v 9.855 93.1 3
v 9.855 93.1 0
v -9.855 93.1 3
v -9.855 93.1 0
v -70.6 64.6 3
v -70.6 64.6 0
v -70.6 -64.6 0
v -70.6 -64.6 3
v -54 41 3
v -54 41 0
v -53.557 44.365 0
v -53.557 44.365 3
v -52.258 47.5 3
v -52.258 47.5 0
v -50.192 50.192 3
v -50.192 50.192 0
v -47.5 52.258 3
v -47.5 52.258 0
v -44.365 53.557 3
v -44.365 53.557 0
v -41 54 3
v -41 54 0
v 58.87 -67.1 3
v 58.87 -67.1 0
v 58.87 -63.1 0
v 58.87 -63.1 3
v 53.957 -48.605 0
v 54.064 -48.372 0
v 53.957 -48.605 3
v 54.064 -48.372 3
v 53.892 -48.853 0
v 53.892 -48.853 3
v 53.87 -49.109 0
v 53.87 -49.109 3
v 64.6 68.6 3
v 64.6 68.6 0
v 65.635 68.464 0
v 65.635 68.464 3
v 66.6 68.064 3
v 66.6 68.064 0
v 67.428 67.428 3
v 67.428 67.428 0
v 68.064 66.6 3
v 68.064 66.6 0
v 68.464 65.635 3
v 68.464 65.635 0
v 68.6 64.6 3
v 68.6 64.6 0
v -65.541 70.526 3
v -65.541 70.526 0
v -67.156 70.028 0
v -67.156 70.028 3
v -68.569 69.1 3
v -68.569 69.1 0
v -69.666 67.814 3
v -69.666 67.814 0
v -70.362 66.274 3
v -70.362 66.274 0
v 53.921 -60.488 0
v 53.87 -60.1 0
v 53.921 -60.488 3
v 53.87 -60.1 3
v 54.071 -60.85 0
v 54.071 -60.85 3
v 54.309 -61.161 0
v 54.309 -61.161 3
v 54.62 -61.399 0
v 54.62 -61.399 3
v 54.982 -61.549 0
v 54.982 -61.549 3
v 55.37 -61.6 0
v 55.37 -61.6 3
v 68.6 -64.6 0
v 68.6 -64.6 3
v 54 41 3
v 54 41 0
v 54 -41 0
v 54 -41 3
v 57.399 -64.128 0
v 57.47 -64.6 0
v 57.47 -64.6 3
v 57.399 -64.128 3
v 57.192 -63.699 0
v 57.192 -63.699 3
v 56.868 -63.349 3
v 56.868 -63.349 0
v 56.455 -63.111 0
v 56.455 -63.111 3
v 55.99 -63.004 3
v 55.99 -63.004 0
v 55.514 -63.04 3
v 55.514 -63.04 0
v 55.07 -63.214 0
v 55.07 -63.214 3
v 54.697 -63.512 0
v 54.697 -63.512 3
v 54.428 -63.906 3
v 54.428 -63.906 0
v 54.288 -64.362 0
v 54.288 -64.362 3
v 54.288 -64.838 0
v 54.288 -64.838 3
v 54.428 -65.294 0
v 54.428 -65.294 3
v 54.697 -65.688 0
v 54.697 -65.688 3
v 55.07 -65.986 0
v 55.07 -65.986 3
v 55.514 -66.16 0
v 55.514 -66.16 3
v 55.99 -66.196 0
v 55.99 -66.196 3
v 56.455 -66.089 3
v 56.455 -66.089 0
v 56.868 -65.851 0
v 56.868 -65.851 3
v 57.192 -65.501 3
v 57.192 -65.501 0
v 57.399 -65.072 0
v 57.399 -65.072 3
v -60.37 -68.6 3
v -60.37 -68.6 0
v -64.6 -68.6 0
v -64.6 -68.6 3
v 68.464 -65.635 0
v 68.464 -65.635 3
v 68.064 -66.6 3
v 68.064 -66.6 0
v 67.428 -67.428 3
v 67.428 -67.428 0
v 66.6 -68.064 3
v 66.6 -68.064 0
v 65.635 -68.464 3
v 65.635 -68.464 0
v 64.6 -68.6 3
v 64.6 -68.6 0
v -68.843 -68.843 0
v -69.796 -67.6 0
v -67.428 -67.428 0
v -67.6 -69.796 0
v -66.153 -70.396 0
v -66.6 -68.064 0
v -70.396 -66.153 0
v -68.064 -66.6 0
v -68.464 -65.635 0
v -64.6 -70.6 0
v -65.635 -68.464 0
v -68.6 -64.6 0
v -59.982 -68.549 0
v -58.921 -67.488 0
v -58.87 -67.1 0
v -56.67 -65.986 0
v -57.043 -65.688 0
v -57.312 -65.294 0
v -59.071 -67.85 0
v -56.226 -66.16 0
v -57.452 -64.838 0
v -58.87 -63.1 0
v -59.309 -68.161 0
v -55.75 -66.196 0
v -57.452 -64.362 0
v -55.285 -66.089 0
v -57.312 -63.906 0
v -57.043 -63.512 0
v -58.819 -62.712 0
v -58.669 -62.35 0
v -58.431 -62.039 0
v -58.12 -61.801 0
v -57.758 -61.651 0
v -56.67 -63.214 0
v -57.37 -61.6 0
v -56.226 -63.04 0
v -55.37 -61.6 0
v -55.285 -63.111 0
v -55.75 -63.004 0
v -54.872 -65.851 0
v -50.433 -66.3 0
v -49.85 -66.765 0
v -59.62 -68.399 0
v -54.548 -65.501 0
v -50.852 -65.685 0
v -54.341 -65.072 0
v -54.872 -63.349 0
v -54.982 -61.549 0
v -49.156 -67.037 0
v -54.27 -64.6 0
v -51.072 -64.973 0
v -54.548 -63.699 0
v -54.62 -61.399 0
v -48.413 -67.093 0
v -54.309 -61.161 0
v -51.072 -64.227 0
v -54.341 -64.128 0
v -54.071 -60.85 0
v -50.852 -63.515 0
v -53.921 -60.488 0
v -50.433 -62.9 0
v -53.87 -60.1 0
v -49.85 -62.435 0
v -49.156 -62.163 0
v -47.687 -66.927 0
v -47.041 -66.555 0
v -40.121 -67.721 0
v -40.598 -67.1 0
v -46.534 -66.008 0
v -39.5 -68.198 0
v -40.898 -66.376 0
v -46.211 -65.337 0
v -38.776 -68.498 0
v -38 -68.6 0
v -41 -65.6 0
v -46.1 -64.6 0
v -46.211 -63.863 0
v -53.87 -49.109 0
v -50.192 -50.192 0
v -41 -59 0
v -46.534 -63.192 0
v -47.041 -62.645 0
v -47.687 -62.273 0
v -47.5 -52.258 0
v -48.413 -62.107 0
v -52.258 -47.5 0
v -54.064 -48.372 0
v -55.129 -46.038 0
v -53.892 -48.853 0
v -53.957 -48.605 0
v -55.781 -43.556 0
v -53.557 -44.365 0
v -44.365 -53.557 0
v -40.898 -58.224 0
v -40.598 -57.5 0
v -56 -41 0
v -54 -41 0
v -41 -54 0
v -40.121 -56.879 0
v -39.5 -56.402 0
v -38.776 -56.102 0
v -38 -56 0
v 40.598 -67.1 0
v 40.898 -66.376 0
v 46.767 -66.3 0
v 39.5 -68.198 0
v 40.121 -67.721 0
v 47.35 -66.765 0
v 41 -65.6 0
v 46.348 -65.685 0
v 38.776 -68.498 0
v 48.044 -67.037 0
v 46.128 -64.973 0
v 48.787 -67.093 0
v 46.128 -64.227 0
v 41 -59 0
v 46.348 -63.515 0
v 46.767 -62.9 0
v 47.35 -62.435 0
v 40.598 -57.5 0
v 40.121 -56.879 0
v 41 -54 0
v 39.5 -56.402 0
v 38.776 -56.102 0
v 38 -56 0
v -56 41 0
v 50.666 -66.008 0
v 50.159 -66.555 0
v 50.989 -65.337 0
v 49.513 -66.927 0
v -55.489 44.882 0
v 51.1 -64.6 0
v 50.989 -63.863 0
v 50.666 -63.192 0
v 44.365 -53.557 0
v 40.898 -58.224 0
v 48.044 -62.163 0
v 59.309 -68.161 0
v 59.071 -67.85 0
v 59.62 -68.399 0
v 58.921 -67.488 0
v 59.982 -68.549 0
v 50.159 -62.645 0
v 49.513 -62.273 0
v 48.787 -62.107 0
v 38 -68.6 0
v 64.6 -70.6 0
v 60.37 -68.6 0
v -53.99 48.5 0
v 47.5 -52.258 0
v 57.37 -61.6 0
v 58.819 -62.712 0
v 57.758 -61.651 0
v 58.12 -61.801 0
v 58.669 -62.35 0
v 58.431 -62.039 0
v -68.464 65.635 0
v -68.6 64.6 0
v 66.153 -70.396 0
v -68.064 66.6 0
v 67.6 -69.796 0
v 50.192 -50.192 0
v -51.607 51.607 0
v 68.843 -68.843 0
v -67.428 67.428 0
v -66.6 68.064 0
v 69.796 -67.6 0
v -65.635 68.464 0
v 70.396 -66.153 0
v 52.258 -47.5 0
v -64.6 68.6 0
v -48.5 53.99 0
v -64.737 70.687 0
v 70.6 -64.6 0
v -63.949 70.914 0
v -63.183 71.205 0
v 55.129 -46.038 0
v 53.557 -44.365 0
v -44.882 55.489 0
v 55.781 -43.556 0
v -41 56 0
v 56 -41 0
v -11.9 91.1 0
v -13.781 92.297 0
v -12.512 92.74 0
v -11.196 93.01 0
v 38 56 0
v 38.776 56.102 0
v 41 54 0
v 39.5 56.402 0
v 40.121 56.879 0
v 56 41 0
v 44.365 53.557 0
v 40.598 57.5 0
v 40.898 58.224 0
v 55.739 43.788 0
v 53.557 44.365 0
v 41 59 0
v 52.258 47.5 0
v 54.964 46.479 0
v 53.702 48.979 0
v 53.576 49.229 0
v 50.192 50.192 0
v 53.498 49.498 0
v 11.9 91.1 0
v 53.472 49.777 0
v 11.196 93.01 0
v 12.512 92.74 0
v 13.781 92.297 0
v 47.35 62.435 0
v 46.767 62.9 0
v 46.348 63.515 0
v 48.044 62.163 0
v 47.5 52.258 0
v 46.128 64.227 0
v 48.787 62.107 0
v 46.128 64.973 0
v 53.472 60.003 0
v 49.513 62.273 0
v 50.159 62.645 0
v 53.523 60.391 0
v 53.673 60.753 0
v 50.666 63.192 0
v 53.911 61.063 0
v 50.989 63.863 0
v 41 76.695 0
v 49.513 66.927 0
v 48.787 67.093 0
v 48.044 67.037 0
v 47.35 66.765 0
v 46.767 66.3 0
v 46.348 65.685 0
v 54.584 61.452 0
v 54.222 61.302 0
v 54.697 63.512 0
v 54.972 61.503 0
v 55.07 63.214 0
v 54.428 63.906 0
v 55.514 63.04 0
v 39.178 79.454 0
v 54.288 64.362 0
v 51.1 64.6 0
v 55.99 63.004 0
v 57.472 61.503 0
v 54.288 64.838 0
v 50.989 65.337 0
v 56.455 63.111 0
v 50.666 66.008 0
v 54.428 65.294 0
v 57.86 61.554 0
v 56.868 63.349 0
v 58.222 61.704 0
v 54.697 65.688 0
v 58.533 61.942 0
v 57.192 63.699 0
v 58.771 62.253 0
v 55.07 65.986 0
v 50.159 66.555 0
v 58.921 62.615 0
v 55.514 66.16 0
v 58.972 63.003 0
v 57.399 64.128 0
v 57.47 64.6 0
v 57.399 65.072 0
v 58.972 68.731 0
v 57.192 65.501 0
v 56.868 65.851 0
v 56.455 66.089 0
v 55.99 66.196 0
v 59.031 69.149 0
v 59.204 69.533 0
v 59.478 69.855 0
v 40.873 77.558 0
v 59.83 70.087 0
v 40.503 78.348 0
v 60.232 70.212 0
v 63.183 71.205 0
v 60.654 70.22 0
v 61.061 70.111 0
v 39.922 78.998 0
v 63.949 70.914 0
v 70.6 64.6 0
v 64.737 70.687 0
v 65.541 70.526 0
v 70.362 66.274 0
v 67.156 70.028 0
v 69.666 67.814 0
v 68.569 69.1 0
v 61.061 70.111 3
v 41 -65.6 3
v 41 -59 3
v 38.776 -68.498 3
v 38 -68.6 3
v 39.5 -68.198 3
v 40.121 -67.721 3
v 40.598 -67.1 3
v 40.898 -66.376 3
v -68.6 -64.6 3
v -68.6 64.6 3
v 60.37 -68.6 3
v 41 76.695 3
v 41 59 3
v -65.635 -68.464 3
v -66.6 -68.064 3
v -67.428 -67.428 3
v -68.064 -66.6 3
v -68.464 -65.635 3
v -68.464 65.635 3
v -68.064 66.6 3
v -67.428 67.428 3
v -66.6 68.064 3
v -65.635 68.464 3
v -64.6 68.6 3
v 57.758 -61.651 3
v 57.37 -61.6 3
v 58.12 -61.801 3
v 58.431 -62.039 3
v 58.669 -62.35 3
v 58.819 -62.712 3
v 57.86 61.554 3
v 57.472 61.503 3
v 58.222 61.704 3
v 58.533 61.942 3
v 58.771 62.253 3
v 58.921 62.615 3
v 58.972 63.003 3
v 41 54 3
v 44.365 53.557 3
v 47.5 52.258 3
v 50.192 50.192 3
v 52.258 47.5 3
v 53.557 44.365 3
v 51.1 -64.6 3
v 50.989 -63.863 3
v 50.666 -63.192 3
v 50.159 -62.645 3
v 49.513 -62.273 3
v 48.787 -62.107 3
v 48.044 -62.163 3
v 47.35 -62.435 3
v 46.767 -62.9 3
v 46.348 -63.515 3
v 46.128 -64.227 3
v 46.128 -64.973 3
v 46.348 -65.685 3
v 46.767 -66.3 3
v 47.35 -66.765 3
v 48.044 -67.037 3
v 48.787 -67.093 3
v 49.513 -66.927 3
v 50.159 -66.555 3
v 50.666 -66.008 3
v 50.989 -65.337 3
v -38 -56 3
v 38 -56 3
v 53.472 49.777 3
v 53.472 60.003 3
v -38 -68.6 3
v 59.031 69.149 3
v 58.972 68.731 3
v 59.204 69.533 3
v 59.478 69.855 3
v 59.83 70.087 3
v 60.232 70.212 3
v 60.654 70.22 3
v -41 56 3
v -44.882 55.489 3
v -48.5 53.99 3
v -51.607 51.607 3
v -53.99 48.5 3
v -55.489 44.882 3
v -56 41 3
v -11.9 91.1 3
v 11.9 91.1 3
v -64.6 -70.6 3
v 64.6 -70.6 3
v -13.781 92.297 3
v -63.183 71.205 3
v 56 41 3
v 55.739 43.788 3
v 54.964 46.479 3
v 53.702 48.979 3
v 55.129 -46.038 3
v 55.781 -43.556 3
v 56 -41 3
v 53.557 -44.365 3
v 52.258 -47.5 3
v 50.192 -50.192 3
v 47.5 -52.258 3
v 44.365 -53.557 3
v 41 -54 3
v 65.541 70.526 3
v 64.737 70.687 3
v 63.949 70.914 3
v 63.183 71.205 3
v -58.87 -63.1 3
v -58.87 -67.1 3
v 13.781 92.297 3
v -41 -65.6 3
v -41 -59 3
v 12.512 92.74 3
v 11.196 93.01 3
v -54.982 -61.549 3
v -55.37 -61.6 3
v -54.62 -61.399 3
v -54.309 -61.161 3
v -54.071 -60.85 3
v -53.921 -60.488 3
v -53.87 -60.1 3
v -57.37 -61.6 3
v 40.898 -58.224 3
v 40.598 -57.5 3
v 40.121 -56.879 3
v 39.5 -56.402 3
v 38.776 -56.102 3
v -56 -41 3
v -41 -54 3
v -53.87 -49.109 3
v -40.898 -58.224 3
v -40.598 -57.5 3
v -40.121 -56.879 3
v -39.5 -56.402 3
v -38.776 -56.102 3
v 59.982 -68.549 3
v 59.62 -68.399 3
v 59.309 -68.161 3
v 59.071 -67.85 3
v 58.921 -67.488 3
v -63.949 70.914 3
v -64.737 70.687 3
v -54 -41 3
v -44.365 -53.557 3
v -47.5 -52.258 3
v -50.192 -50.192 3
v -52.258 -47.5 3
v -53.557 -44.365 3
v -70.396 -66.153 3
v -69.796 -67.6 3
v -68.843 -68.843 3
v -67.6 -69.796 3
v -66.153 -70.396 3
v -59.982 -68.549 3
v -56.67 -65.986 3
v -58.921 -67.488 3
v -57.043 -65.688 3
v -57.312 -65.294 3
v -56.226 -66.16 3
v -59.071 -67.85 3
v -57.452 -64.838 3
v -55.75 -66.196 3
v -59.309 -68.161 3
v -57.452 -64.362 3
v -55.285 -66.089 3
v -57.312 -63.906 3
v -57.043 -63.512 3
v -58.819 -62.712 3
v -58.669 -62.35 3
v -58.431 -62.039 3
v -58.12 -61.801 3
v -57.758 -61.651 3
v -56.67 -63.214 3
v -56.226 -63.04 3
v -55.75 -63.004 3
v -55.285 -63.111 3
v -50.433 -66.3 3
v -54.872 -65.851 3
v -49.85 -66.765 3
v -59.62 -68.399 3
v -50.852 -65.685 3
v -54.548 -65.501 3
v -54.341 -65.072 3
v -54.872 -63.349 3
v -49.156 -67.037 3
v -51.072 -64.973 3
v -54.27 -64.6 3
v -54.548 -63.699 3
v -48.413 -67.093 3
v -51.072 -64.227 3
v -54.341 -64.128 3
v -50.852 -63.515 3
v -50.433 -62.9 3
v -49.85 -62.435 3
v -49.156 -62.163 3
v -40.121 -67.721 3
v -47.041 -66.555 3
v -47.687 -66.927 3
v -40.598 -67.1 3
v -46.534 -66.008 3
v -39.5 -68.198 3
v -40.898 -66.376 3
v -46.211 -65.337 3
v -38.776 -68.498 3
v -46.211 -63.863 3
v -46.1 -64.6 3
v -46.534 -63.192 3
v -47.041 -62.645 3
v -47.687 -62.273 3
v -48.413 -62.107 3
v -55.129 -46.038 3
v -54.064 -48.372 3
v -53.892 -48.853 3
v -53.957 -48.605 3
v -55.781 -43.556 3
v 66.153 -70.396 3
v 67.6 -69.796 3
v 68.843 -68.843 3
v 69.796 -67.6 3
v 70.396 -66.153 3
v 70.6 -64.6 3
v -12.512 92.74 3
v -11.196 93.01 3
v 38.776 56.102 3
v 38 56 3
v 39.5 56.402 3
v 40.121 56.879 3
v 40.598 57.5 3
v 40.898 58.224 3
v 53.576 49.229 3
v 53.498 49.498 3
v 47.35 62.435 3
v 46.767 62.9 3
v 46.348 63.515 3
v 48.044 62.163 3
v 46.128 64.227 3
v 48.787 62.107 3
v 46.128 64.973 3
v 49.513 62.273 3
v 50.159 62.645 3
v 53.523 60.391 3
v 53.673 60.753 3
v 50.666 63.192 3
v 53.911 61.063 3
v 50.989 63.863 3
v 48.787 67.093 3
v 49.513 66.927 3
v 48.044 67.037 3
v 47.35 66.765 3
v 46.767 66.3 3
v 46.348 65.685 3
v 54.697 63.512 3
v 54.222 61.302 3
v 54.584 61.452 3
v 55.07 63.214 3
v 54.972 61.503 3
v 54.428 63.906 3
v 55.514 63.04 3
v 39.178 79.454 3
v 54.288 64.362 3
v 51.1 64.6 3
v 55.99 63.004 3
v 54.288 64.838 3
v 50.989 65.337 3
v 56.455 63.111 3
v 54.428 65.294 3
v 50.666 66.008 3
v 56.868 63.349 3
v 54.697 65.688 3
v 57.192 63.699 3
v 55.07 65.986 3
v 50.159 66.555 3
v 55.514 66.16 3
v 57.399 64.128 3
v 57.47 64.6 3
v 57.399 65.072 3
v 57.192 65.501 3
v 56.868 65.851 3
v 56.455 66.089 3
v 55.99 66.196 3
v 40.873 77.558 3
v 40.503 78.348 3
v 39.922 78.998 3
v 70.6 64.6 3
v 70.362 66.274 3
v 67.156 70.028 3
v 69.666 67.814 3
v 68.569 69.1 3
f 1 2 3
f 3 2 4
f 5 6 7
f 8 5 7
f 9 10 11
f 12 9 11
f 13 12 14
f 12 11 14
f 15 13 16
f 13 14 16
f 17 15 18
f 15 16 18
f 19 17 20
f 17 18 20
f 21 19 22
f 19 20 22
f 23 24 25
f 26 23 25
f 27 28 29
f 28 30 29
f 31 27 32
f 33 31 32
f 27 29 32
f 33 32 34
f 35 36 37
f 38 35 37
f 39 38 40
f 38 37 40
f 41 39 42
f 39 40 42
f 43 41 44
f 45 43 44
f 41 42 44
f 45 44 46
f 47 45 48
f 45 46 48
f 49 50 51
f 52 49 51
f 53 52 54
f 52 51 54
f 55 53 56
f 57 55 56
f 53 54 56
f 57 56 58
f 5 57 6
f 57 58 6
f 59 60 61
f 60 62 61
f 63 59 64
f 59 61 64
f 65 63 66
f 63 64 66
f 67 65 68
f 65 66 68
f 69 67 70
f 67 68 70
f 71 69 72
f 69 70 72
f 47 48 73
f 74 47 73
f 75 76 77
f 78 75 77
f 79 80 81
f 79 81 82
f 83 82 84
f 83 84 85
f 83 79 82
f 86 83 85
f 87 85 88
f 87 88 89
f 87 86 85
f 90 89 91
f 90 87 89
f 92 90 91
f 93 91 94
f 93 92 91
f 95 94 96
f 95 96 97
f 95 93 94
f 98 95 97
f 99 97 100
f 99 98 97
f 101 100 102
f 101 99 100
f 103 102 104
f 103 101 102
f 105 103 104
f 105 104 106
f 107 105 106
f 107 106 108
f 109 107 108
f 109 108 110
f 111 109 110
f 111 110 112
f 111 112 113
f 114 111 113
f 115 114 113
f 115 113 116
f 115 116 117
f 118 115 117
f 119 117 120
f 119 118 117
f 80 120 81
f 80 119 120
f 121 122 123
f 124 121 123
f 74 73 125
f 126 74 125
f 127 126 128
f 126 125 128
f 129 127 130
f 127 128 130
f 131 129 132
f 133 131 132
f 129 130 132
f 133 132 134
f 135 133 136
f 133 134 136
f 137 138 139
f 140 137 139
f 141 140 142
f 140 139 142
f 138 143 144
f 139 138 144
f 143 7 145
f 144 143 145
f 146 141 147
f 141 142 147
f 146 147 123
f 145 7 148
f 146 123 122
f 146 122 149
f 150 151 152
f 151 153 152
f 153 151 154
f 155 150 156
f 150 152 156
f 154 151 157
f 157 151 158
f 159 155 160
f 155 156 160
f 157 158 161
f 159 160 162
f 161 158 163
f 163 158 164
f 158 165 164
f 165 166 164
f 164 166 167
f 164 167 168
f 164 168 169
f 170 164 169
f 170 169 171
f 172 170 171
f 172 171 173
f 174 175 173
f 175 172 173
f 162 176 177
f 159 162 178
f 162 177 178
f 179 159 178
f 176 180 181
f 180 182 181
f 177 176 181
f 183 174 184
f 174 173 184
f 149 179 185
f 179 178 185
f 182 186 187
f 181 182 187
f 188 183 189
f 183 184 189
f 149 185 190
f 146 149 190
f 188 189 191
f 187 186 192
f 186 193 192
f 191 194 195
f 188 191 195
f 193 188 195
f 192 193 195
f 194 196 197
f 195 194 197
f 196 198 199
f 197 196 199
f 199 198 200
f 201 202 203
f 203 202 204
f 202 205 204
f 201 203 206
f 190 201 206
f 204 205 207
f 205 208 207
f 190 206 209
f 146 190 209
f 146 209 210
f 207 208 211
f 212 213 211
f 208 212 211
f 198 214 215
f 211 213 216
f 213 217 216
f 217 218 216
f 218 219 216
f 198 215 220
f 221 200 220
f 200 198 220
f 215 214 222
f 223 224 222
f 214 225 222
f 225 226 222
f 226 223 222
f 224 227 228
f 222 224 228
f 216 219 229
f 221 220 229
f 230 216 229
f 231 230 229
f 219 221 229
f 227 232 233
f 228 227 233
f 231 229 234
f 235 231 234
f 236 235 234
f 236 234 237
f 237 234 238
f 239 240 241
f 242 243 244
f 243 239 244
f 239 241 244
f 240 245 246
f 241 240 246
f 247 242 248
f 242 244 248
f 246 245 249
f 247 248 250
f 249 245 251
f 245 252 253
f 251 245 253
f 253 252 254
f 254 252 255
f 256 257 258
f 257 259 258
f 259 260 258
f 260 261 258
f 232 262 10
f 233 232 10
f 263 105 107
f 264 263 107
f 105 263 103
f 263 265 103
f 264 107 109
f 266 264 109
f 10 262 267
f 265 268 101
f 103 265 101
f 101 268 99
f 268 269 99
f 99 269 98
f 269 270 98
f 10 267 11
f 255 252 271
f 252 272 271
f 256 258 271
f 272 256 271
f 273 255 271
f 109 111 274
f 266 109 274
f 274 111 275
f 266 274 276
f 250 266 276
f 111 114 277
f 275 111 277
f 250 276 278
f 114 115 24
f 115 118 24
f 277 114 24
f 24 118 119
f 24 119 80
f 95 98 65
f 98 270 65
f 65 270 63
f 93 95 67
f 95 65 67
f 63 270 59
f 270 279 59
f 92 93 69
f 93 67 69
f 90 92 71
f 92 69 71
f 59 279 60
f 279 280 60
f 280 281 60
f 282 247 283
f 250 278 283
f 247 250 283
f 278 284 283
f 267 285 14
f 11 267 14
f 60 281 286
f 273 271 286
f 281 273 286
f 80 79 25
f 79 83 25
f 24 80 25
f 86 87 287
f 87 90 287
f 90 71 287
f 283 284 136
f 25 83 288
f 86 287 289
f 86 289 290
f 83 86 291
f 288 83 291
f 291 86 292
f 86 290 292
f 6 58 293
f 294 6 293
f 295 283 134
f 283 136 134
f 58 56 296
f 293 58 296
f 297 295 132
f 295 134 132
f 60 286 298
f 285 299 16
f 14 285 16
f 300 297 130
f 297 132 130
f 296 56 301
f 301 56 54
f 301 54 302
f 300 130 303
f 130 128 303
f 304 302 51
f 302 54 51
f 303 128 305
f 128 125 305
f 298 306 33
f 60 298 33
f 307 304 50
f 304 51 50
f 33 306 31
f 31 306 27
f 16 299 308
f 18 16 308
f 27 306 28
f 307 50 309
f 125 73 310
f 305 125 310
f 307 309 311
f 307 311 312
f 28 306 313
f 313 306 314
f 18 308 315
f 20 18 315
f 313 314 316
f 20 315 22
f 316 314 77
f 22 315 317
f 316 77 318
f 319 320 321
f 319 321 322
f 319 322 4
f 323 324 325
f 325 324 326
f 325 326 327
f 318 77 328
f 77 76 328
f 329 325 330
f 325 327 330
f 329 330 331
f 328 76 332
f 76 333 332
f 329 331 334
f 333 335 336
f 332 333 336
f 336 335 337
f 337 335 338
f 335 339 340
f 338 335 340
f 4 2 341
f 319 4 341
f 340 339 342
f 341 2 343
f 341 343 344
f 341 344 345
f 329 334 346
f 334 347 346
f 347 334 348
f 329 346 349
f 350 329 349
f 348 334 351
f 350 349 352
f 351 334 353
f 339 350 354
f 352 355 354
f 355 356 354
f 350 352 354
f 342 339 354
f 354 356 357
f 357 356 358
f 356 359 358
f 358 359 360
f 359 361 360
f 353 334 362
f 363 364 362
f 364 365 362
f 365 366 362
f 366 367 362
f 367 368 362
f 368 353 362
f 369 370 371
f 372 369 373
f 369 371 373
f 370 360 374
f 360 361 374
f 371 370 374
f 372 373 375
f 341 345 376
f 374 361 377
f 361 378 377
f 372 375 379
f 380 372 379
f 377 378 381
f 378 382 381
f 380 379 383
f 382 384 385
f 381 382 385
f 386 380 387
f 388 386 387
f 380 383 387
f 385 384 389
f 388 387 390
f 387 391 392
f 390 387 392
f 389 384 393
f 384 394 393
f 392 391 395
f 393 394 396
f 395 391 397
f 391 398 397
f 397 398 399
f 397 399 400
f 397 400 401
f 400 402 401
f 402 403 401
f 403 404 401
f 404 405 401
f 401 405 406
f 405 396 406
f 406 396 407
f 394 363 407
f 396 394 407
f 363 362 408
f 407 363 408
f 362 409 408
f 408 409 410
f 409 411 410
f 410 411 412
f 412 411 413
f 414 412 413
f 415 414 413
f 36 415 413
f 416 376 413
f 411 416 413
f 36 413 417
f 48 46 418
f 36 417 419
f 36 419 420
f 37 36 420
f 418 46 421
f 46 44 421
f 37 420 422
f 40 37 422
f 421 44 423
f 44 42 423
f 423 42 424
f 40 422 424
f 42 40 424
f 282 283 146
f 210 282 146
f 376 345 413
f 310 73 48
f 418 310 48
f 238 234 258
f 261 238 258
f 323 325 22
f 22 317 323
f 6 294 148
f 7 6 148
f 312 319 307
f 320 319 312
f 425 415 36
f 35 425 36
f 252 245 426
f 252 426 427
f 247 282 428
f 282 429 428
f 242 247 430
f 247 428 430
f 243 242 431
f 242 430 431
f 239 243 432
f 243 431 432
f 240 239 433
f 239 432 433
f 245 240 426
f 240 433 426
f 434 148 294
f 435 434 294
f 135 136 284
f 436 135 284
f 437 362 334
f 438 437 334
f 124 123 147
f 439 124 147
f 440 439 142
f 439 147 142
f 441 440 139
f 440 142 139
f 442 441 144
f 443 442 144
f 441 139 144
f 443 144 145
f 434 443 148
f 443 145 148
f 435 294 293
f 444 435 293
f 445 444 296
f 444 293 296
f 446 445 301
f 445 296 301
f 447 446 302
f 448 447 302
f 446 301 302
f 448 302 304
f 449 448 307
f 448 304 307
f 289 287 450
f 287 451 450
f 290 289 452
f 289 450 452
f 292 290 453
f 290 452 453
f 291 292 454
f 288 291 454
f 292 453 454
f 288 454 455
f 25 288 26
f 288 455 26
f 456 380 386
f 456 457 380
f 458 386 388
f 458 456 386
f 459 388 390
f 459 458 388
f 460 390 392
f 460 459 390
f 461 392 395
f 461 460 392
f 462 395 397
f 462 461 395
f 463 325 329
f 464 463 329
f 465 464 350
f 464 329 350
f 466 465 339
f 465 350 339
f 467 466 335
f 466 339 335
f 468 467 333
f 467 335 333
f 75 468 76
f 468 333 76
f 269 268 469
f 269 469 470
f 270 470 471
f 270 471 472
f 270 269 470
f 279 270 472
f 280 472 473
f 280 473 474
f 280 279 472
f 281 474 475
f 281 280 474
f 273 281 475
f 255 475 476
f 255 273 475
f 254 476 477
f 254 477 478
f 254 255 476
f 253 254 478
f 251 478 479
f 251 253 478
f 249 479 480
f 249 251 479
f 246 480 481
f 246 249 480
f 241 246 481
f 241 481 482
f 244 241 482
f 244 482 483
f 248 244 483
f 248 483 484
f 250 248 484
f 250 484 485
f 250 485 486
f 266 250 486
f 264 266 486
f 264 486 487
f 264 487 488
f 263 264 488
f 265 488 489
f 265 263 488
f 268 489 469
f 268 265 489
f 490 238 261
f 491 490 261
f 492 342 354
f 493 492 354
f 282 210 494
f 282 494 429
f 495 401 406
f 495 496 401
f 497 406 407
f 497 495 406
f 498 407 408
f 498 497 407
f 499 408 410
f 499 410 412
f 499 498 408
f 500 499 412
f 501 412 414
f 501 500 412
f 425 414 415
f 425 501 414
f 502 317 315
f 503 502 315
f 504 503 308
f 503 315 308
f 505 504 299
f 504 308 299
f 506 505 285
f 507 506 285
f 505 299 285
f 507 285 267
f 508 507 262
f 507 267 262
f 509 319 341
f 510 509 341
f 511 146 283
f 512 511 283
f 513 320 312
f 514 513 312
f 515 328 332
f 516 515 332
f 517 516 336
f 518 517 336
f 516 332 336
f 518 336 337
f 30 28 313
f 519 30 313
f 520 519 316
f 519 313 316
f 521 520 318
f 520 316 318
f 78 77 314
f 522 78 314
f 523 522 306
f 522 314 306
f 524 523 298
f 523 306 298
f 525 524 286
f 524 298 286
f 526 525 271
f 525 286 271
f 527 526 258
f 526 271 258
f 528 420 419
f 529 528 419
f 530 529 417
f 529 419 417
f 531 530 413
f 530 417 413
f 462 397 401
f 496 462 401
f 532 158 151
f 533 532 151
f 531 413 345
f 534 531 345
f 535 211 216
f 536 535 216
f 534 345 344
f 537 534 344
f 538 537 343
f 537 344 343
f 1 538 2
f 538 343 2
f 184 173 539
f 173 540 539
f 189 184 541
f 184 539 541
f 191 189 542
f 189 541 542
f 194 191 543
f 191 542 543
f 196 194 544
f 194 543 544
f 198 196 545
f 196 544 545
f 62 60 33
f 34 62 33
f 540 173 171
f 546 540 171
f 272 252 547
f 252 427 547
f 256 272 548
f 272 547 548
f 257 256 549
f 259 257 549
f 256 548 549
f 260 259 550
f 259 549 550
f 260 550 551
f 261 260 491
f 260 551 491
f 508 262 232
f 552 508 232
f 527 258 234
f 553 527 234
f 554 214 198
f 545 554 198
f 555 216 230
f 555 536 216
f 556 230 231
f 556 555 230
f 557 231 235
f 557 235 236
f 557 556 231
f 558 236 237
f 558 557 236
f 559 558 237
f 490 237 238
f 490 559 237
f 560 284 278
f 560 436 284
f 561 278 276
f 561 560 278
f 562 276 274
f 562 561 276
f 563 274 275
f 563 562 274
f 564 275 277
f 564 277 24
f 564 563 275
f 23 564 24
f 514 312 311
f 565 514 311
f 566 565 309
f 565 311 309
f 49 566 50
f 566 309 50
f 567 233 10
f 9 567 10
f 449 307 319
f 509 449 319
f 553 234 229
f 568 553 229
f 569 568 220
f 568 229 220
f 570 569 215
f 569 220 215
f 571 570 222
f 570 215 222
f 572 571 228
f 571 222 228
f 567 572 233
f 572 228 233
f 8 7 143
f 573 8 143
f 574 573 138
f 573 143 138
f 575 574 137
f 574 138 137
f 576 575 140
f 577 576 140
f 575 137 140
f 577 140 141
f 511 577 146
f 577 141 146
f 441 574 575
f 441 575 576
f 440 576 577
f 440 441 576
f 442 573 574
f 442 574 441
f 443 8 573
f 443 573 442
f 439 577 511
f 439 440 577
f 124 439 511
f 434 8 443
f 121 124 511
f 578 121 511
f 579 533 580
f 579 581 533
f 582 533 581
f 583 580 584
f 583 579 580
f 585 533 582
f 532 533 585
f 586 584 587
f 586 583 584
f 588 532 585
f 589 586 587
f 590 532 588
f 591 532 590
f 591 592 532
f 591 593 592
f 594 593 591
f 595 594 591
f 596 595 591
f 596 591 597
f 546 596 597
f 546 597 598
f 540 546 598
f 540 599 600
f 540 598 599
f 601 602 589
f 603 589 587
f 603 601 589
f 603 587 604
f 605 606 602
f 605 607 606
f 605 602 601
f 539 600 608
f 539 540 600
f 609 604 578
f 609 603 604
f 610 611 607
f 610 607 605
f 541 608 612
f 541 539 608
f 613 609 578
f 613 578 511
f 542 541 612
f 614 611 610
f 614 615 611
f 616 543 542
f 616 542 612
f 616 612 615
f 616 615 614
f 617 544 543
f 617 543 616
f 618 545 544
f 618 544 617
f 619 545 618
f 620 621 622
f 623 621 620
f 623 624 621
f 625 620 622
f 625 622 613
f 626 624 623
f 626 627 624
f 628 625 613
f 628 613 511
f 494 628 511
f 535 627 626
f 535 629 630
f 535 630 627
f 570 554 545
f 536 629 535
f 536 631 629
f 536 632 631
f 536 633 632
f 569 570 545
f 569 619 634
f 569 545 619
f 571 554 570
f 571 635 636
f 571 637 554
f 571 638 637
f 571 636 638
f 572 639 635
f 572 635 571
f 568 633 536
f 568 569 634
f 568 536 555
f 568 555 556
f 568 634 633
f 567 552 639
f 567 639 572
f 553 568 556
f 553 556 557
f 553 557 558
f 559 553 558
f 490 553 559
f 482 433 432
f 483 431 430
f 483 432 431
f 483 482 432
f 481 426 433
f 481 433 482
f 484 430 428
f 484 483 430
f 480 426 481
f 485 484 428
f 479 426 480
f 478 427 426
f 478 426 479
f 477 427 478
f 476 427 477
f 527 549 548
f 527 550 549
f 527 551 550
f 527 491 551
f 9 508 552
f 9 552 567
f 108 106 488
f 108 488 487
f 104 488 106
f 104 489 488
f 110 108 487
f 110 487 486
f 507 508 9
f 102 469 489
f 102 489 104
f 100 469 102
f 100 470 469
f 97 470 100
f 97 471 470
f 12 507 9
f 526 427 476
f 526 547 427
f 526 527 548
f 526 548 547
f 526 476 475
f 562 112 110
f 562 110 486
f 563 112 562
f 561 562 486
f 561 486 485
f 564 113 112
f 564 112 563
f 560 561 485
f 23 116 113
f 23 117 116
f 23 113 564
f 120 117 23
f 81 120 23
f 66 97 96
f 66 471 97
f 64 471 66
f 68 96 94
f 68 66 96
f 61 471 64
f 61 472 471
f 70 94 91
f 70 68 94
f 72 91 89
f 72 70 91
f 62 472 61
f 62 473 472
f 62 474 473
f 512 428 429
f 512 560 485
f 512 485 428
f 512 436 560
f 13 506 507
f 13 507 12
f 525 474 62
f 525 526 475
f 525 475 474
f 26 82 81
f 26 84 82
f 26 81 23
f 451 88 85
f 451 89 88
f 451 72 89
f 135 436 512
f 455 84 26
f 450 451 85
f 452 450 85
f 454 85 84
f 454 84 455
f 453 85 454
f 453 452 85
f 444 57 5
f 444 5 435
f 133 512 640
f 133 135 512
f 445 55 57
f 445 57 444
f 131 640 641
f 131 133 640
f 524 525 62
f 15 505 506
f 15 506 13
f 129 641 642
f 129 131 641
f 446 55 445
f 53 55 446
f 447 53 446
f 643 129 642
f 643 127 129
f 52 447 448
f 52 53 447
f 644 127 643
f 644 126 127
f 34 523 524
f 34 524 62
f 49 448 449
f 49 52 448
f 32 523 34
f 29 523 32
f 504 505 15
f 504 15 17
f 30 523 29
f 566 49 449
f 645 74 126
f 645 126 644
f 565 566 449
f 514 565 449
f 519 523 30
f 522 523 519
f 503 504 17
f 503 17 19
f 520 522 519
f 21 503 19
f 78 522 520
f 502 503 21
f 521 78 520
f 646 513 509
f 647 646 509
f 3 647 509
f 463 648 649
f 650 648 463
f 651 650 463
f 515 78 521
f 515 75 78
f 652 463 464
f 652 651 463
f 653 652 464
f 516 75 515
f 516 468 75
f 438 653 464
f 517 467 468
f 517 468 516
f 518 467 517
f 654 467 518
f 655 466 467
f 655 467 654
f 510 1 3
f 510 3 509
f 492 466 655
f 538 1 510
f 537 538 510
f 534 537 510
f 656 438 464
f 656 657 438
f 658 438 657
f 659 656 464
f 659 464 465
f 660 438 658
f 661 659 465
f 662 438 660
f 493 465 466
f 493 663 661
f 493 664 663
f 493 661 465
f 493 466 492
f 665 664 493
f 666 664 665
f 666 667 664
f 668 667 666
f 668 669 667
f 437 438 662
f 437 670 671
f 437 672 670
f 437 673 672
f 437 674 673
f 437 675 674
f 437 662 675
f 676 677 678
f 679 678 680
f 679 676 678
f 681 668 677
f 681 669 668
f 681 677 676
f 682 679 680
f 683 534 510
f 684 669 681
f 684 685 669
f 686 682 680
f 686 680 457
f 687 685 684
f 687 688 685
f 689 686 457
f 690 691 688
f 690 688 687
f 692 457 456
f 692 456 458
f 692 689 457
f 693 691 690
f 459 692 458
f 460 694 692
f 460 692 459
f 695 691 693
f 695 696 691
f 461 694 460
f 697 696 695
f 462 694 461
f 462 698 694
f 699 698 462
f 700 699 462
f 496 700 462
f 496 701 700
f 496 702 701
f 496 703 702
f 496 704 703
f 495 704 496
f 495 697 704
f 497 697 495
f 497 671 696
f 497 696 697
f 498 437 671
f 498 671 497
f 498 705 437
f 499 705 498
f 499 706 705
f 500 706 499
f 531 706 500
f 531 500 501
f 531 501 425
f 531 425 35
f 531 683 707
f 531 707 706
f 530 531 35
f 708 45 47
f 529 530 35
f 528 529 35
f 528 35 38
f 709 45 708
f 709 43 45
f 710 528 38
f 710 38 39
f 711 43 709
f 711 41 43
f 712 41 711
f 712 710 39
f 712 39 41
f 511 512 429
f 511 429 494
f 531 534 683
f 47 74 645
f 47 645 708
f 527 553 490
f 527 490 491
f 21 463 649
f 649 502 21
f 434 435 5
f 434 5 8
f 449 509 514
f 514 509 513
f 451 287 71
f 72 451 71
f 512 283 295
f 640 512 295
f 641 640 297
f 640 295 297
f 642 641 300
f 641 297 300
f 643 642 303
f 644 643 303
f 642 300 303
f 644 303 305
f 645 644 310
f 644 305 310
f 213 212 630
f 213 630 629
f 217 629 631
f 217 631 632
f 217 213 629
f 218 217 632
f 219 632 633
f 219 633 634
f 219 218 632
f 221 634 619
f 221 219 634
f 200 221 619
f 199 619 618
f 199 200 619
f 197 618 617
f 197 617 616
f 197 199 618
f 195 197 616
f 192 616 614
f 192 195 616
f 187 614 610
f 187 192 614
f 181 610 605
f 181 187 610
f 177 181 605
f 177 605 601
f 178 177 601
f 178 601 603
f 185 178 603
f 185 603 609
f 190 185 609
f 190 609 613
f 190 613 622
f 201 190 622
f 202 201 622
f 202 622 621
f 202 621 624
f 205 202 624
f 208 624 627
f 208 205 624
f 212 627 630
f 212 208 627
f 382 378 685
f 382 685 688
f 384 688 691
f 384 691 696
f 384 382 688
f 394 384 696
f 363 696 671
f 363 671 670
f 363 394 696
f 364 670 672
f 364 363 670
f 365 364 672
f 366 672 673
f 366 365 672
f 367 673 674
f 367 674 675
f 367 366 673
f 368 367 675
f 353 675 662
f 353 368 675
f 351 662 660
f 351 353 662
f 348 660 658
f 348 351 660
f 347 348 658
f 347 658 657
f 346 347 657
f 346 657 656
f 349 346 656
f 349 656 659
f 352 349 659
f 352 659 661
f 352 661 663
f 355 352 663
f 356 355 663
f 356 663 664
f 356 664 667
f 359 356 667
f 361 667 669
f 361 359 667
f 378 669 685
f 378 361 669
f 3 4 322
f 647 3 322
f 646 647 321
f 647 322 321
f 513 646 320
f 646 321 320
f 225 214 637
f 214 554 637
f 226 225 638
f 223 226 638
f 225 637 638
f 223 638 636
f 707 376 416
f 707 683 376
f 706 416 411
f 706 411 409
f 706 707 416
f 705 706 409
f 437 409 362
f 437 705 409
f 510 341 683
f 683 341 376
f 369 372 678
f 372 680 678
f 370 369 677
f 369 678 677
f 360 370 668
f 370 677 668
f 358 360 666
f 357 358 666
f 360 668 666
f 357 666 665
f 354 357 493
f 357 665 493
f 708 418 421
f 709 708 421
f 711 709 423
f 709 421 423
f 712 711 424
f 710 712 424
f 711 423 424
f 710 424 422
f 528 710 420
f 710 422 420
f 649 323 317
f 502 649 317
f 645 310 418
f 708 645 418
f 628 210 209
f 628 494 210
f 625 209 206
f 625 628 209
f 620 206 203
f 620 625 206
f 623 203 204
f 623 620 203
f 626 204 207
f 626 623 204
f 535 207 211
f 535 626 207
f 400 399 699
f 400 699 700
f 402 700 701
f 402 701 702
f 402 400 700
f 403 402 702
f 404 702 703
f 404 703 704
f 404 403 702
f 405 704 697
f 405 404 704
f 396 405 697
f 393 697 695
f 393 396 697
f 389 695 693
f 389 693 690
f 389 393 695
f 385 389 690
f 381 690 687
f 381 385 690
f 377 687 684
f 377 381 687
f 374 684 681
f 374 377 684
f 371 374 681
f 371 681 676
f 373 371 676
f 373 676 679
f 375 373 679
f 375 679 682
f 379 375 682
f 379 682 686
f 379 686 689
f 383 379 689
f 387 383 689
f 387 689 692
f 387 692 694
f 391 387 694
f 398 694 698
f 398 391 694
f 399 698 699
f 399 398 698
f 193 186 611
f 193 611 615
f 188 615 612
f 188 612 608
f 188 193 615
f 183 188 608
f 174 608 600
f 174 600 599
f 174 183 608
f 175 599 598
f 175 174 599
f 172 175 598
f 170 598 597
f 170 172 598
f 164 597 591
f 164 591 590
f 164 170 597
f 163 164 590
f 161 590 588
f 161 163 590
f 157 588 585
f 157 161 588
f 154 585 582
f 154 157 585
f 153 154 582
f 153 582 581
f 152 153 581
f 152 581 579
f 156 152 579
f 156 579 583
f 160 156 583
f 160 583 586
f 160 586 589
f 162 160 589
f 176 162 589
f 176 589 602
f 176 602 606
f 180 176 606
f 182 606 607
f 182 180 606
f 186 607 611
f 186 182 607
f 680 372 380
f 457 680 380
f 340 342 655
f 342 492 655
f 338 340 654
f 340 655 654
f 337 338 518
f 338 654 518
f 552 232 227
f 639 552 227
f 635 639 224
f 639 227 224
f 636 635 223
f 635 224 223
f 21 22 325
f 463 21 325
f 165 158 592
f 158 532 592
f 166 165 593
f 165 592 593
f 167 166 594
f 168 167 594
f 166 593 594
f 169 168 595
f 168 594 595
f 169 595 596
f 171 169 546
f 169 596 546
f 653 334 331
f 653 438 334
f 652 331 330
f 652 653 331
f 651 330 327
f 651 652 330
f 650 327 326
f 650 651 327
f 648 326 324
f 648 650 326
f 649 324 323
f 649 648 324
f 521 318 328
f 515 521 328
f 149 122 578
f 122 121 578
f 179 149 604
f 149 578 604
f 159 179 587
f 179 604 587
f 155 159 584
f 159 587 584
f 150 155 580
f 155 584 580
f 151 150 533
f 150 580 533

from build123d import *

# Parameters (mm, degrees)
SKETCH2_R           = 1.6
SKETCH2_R_2         = 2.5
SKETCH2_W           = 82
SKETCH2_H           = 12.6
BOSS_EXTRUDE1_DEPTH = 3
FILLET2_R           = 1.5
FILLET3_R           = 3


with BuildPart() as part:
    # Sketch2 → Boss-Extrude1 (new body)
    # profile 1 of 2: a face of its own
    with BuildSketch(Plane.XY):
        with BuildLine():
            ThreePointArc((-65.540902989, 70.525765905), (-69.163190657, 68.495804286), (-70.6, 64.6))
            Line((-70.6, 64.6), (-70.6, -64.6))
            ThreePointArc((-70.6, -64.6), (-68.842640687, -68.842640687), (-64.6, -70.6))
            Line((-64.6, -70.6), (64.6, -70.6))
            ThreePointArc((64.6, -70.6), (68.842640687, -68.842640687), (70.6, -64.6))
            Line((70.6, -64.6), (70.6, 64.6))
            ThreePointArc((70.6, 64.6), (69.163190657, 68.495804286), (65.540902989, 70.525765905))
            ThreePointArc((65.540902989, 70.525765905), (64.340790015, 70.792848887), (63.182522555, 71.205184867))
            Line((63.182522555, 71.205184867), (13.781138102, 92.296857547))
            ThreePointArc((13.781138102, 92.296857547), (11.858510235, 92.897157125), (9.854586018, 93.1))
            Line((9.854586018, 93.1), (-9.854586018, 93.1))
            ThreePointArc((-9.854586018, 93.1), (-11.858510235, 92.897157125), (-13.781138102, 92.296857547))
            Line((-13.781138102, 92.296857547), (-63.182522555, 71.205184867))
            ThreePointArc((-63.182522555, 71.205184867), (-64.340790015, 70.792848887), (-65.540902989, 70.525765905))
        make_face()
        with Locations((-55.87, -64.6)):
            Circle(SKETCH2_R, mode=Mode.SUBTRACT)
        with Locations((-48.6, -64.6)):
            Circle(SKETCH2_R_2, mode=Mode.SUBTRACT)
        with BuildLine():
            Line((-11.9, 91.1), (-6, 91.1))
            Line((-6, 91.1), (6, 91.1))
            Line((6, 91.1), (11.9, 91.1))
            Line((11.9, 91.1), (41, 78.675901328))
            Line((41, 78.675901328), (41, 56))
            Line((41, 56), (-41, 56))
            ThreePointArc((-41, 56), (-51.606601718, 51.606601718), (-56, 41))
            Line((-56, 41), (-56, -41))
            ThreePointArc((-56, -41), (-55.457696912, -44.996873778), (-53.87, -48.704745291))
            Line((-53.87, -48.704745291), (-53.87, -61.6))
            Line((-53.87, -61.6), (-58.87, -61.6))
            Line((-58.87, -61.6), (-58.87, -68.6))
            Line((-58.87, -68.6), (-64.6, -68.6))
            ThreePointArc((-64.6, -68.6), (-67.428427125, -67.428427125), (-68.6, -64.6))
            Line((-68.6, -64.6), (-68.6, 64.6))
            ThreePointArc((-68.6, 64.6), (-67.428427125, 67.428427125), (-64.6, 68.6))
            Line((-64.6, 68.6), (-11.9, 91.1))
        make_face(mode=Mode.SUBTRACT)
        with Locations((0, -62.3)):
            Rectangle(SKETCH2_W, SKETCH2_H, mode=Mode.SUBTRACT)
        with Locations((48.6, -64.6)):
            Circle(SKETCH2_R_2, mode=Mode.SUBTRACT)
        with Locations((55.87, -64.6)):
            Circle(SKETCH2_R, mode=Mode.SUBTRACT)
        with BuildLine():
            Line((41, -54), (-41, -54))
            ThreePointArc((-41, -54), (-50.192388155, -50.192388155), (-54, -41))
            Line((-54, -41), (-54, 41))
            ThreePointArc((-54, 41), (-50.192388155, 50.192388155), (-41, 54))
            Line((-41, 54), (41, 54))
            ThreePointArc((41, 54), (50.192388155, 50.192388155), (54, 41))
            Line((54, 41), (54, -41))
            ThreePointArc((54, -41), (50.192388155, -50.192388155), (41, -54))
        make_face(mode=Mode.SUBTRACT)
        with BuildLine():
            Line((58.972044185, 61.502827435), (58.972044185, 71.002827435))
            Line((58.972044185, 71.002827435), (64.6, 68.6))
            ThreePointArc((64.6, 68.6), (67.428427125, 67.428427125), (68.6, 64.6))
            Line((68.6, 64.6), (68.6, -64.6))
            ThreePointArc((68.6, -64.6), (67.428427125, -67.428427125), (64.6, -68.6))
            Line((64.6, -68.6), (58.87, -68.6))
            Line((58.87, -68.6), (58.87, -61.6))
            Line((58.87, -61.6), (53.87, -61.6))
            Line((53.87, -61.6), (53.87, -48.704745291))
            ThreePointArc((53.87, -48.704745291), (55.457696912, -44.996873778), (56, -41))
            Line((56, -41), (56, 41))
            ThreePointArc((56, 41), (55.354105036, 45.354270159), (53.472044185, 49.333553495))
            Line((53.472044185, 49.333553495), (53.472044185, 61.502827435))
            Line((53.472044185, 61.502827435), (58.972044185, 61.502827435))
        make_face(mode=Mode.SUBTRACT)
        with Locations((48.6, 64.6)):
            Circle(SKETCH2_R_2, mode=Mode.SUBTRACT)
        with Locations((55.87, 64.6)):
            Circle(SKETCH2_R, mode=Mode.SUBTRACT)
    # profile 2 of 2: a face of its own
    with BuildSketch(Plane.XY):
        with BuildLine():
            ThreePointArc((-65.540902989, 70.525765905), (-69.163190657, 68.495804286), (-70.6, 64.6))
            Line((-70.6, 64.6), (-70.6, -64.6))
            ThreePointArc((-70.6, -64.6), (-68.842640687, -68.842640687), (-64.6, -70.6))
            Line((-64.6, -70.6), (64.6, -70.6))
            ThreePointArc((64.6, -70.6), (68.842640687, -68.842640687), (70.6, -64.6))
            Line((70.6, -64.6), (70.6, 64.6))
            ThreePointArc((70.6, 64.6), (69.163190657, 68.495804286), (65.540902989, 70.525765905))
            ThreePointArc((65.540902989, 70.525765905), (64.340790015, 70.792848887), (63.182522555, 71.205184867))
            Line((63.182522555, 71.205184867), (13.781138102, 92.296857547))
            ThreePointArc((13.781138102, 92.296857547), (11.858510235, 92.897157125), (9.854586018, 93.1))
            Line((9.854586018, 93.1), (-9.854586018, 93.1))
            ThreePointArc((-9.854586018, 93.1), (-11.858510235, 92.897157125), (-13.781138102, 92.296857547))
            Line((-13.781138102, 92.296857547), (-63.182522555, 71.205184867))
            ThreePointArc((-63.182522555, 71.205184867), (-64.340790015, 70.792848887), (-65.540902989, 70.525765905))
        make_face()
        with Locations((-55.87, -64.6)):
            Circle(SKETCH2_R, mode=Mode.SUBTRACT)
        with Locations((-48.6, -64.6)):
            Circle(SKETCH2_R_2, mode=Mode.SUBTRACT)
        with BuildLine():
            Line((-11.9, 91.1), (-6, 91.1))
            Line((-6, 91.1), (6, 91.1))
            Line((6, 91.1), (11.9, 91.1))
            Line((11.9, 91.1), (41, 78.675901328))
            Line((41, 78.675901328), (41, 56))
            Line((41, 56), (-41, 56))
            ThreePointArc((-41, 56), (-51.606601718, 51.606601718), (-56, 41))
            Line((-56, 41), (-56, -41))
            ThreePointArc((-56, -41), (-55.457696912, -44.996873778), (-53.87, -48.704745291))
            Line((-53.87, -48.704745291), (-53.87, -61.6))
            Line((-53.87, -61.6), (-58.87, -61.6))
            Line((-58.87, -61.6), (-58.87, -68.6))
            Line((-58.87, -68.6), (-64.6, -68.6))
            ThreePointArc((-64.6, -68.6), (-67.428427125, -67.428427125), (-68.6, -64.6))
            Line((-68.6, -64.6), (-68.6, 64.6))
            ThreePointArc((-68.6, 64.6), (-67.428427125, 67.428427125), (-64.6, 68.6))
            Line((-64.6, 68.6), (-11.9, 91.1))
        make_face(mode=Mode.SUBTRACT)
        with Locations((0, -62.3)):
            Rectangle(SKETCH2_W, SKETCH2_H, mode=Mode.SUBTRACT)
        with Locations((48.6, -64.6)):
            Circle(SKETCH2_R_2, mode=Mode.SUBTRACT)
        with Locations((55.87, -64.6)):
            Circle(SKETCH2_R, mode=Mode.SUBTRACT)
        with BuildLine():
            Line((41, -54), (-41, -54))
            ThreePointArc((-41, -54), (-50.192388155, -50.192388155), (-54, -41))
            Line((-54, -41), (-54, 41))
            ThreePointArc((-54, 41), (-50.192388155, 50.192388155), (-41, 54))
            Line((-41, 54), (41, 54))
            ThreePointArc((41, 54), (50.192388155, 50.192388155), (54, 41))
            Line((54, 41), (54, -41))
            ThreePointArc((54, -41), (50.192388155, -50.192388155), (41, -54))
        make_face(mode=Mode.SUBTRACT)
        with BuildLine():
            Line((58.972044185, 61.502827435), (58.972044185, 71.002827435))
            Line((58.972044185, 71.002827435), (64.6, 68.6))
            ThreePointArc((64.6, 68.6), (67.428427125, 67.428427125), (68.6, 64.6))
            Line((68.6, 64.6), (68.6, -64.6))
            ThreePointArc((68.6, -64.6), (67.428427125, -67.428427125), (64.6, -68.6))
            Line((64.6, -68.6), (58.87, -68.6))
            Line((58.87, -68.6), (58.87, -61.6))
            Line((58.87, -61.6), (53.87, -61.6))
            Line((53.87, -61.6), (53.87, -48.704745291))
            ThreePointArc((53.87, -48.704745291), (55.457696912, -44.996873778), (56, -41))
            Line((56, -41), (56, 41))
            ThreePointArc((56, 41), (55.354105036, 45.354270159), (53.472044185, 49.333553495))
            Line((53.472044185, 49.333553495), (53.472044185, 61.502827435))
            Line((53.472044185, 61.502827435), (58.972044185, 61.502827435))
        make_face(mode=Mode.SUBTRACT)
        with Locations((48.6, 64.6)):
            Circle(SKETCH2_R_2, mode=Mode.SUBTRACT)
        with Locations((55.87, 64.6)):
            Circle(SKETCH2_R, mode=Mode.SUBTRACT)
    extrude(amount=BOSS_EXTRUDE1_DEPTH)

    # Fillet2
    fillet2_edges = [part.edges().sort_by_distance(p)[0] for p in [
        (58.972044185, 71.002827435, 1.5),
        (58.972044185, 61.502827435, 1.5),
        (53.472044185, 61.502827435, 1.5),
        (53.472044185, 49.333553495, 1.5),
        (53.87, -48.704745291, 1.5),
        (53.87, -61.6, 1.5),
        (58.87, -61.6, 1.5),
        (58.87, -68.6, 1.5),
        (-58.87, -68.6, 1.5),
        (-58.87, -61.6, 1.5),
        (-53.87, -61.6, 1.5),
        (-53.87, -48.704745291, 1.5),
    ]]
    fillet(fillet2_edges, radius=FILLET2_R)

    # Fillet3
    fillet3_edges = [part.edges().sort_by_distance(p)[0] for p in [
        (-41, -68.6, 1.5),
        (41, -68.6, 1.5),
        (41, -56, 1.5),
        (-41, -56, 1.5),
        (41, 56, 1.5),
        (41, 78.675901328, 1.5),
    ]]
    fillet(fillet3_edges, radius=FILLET3_R)


solid = part.part
